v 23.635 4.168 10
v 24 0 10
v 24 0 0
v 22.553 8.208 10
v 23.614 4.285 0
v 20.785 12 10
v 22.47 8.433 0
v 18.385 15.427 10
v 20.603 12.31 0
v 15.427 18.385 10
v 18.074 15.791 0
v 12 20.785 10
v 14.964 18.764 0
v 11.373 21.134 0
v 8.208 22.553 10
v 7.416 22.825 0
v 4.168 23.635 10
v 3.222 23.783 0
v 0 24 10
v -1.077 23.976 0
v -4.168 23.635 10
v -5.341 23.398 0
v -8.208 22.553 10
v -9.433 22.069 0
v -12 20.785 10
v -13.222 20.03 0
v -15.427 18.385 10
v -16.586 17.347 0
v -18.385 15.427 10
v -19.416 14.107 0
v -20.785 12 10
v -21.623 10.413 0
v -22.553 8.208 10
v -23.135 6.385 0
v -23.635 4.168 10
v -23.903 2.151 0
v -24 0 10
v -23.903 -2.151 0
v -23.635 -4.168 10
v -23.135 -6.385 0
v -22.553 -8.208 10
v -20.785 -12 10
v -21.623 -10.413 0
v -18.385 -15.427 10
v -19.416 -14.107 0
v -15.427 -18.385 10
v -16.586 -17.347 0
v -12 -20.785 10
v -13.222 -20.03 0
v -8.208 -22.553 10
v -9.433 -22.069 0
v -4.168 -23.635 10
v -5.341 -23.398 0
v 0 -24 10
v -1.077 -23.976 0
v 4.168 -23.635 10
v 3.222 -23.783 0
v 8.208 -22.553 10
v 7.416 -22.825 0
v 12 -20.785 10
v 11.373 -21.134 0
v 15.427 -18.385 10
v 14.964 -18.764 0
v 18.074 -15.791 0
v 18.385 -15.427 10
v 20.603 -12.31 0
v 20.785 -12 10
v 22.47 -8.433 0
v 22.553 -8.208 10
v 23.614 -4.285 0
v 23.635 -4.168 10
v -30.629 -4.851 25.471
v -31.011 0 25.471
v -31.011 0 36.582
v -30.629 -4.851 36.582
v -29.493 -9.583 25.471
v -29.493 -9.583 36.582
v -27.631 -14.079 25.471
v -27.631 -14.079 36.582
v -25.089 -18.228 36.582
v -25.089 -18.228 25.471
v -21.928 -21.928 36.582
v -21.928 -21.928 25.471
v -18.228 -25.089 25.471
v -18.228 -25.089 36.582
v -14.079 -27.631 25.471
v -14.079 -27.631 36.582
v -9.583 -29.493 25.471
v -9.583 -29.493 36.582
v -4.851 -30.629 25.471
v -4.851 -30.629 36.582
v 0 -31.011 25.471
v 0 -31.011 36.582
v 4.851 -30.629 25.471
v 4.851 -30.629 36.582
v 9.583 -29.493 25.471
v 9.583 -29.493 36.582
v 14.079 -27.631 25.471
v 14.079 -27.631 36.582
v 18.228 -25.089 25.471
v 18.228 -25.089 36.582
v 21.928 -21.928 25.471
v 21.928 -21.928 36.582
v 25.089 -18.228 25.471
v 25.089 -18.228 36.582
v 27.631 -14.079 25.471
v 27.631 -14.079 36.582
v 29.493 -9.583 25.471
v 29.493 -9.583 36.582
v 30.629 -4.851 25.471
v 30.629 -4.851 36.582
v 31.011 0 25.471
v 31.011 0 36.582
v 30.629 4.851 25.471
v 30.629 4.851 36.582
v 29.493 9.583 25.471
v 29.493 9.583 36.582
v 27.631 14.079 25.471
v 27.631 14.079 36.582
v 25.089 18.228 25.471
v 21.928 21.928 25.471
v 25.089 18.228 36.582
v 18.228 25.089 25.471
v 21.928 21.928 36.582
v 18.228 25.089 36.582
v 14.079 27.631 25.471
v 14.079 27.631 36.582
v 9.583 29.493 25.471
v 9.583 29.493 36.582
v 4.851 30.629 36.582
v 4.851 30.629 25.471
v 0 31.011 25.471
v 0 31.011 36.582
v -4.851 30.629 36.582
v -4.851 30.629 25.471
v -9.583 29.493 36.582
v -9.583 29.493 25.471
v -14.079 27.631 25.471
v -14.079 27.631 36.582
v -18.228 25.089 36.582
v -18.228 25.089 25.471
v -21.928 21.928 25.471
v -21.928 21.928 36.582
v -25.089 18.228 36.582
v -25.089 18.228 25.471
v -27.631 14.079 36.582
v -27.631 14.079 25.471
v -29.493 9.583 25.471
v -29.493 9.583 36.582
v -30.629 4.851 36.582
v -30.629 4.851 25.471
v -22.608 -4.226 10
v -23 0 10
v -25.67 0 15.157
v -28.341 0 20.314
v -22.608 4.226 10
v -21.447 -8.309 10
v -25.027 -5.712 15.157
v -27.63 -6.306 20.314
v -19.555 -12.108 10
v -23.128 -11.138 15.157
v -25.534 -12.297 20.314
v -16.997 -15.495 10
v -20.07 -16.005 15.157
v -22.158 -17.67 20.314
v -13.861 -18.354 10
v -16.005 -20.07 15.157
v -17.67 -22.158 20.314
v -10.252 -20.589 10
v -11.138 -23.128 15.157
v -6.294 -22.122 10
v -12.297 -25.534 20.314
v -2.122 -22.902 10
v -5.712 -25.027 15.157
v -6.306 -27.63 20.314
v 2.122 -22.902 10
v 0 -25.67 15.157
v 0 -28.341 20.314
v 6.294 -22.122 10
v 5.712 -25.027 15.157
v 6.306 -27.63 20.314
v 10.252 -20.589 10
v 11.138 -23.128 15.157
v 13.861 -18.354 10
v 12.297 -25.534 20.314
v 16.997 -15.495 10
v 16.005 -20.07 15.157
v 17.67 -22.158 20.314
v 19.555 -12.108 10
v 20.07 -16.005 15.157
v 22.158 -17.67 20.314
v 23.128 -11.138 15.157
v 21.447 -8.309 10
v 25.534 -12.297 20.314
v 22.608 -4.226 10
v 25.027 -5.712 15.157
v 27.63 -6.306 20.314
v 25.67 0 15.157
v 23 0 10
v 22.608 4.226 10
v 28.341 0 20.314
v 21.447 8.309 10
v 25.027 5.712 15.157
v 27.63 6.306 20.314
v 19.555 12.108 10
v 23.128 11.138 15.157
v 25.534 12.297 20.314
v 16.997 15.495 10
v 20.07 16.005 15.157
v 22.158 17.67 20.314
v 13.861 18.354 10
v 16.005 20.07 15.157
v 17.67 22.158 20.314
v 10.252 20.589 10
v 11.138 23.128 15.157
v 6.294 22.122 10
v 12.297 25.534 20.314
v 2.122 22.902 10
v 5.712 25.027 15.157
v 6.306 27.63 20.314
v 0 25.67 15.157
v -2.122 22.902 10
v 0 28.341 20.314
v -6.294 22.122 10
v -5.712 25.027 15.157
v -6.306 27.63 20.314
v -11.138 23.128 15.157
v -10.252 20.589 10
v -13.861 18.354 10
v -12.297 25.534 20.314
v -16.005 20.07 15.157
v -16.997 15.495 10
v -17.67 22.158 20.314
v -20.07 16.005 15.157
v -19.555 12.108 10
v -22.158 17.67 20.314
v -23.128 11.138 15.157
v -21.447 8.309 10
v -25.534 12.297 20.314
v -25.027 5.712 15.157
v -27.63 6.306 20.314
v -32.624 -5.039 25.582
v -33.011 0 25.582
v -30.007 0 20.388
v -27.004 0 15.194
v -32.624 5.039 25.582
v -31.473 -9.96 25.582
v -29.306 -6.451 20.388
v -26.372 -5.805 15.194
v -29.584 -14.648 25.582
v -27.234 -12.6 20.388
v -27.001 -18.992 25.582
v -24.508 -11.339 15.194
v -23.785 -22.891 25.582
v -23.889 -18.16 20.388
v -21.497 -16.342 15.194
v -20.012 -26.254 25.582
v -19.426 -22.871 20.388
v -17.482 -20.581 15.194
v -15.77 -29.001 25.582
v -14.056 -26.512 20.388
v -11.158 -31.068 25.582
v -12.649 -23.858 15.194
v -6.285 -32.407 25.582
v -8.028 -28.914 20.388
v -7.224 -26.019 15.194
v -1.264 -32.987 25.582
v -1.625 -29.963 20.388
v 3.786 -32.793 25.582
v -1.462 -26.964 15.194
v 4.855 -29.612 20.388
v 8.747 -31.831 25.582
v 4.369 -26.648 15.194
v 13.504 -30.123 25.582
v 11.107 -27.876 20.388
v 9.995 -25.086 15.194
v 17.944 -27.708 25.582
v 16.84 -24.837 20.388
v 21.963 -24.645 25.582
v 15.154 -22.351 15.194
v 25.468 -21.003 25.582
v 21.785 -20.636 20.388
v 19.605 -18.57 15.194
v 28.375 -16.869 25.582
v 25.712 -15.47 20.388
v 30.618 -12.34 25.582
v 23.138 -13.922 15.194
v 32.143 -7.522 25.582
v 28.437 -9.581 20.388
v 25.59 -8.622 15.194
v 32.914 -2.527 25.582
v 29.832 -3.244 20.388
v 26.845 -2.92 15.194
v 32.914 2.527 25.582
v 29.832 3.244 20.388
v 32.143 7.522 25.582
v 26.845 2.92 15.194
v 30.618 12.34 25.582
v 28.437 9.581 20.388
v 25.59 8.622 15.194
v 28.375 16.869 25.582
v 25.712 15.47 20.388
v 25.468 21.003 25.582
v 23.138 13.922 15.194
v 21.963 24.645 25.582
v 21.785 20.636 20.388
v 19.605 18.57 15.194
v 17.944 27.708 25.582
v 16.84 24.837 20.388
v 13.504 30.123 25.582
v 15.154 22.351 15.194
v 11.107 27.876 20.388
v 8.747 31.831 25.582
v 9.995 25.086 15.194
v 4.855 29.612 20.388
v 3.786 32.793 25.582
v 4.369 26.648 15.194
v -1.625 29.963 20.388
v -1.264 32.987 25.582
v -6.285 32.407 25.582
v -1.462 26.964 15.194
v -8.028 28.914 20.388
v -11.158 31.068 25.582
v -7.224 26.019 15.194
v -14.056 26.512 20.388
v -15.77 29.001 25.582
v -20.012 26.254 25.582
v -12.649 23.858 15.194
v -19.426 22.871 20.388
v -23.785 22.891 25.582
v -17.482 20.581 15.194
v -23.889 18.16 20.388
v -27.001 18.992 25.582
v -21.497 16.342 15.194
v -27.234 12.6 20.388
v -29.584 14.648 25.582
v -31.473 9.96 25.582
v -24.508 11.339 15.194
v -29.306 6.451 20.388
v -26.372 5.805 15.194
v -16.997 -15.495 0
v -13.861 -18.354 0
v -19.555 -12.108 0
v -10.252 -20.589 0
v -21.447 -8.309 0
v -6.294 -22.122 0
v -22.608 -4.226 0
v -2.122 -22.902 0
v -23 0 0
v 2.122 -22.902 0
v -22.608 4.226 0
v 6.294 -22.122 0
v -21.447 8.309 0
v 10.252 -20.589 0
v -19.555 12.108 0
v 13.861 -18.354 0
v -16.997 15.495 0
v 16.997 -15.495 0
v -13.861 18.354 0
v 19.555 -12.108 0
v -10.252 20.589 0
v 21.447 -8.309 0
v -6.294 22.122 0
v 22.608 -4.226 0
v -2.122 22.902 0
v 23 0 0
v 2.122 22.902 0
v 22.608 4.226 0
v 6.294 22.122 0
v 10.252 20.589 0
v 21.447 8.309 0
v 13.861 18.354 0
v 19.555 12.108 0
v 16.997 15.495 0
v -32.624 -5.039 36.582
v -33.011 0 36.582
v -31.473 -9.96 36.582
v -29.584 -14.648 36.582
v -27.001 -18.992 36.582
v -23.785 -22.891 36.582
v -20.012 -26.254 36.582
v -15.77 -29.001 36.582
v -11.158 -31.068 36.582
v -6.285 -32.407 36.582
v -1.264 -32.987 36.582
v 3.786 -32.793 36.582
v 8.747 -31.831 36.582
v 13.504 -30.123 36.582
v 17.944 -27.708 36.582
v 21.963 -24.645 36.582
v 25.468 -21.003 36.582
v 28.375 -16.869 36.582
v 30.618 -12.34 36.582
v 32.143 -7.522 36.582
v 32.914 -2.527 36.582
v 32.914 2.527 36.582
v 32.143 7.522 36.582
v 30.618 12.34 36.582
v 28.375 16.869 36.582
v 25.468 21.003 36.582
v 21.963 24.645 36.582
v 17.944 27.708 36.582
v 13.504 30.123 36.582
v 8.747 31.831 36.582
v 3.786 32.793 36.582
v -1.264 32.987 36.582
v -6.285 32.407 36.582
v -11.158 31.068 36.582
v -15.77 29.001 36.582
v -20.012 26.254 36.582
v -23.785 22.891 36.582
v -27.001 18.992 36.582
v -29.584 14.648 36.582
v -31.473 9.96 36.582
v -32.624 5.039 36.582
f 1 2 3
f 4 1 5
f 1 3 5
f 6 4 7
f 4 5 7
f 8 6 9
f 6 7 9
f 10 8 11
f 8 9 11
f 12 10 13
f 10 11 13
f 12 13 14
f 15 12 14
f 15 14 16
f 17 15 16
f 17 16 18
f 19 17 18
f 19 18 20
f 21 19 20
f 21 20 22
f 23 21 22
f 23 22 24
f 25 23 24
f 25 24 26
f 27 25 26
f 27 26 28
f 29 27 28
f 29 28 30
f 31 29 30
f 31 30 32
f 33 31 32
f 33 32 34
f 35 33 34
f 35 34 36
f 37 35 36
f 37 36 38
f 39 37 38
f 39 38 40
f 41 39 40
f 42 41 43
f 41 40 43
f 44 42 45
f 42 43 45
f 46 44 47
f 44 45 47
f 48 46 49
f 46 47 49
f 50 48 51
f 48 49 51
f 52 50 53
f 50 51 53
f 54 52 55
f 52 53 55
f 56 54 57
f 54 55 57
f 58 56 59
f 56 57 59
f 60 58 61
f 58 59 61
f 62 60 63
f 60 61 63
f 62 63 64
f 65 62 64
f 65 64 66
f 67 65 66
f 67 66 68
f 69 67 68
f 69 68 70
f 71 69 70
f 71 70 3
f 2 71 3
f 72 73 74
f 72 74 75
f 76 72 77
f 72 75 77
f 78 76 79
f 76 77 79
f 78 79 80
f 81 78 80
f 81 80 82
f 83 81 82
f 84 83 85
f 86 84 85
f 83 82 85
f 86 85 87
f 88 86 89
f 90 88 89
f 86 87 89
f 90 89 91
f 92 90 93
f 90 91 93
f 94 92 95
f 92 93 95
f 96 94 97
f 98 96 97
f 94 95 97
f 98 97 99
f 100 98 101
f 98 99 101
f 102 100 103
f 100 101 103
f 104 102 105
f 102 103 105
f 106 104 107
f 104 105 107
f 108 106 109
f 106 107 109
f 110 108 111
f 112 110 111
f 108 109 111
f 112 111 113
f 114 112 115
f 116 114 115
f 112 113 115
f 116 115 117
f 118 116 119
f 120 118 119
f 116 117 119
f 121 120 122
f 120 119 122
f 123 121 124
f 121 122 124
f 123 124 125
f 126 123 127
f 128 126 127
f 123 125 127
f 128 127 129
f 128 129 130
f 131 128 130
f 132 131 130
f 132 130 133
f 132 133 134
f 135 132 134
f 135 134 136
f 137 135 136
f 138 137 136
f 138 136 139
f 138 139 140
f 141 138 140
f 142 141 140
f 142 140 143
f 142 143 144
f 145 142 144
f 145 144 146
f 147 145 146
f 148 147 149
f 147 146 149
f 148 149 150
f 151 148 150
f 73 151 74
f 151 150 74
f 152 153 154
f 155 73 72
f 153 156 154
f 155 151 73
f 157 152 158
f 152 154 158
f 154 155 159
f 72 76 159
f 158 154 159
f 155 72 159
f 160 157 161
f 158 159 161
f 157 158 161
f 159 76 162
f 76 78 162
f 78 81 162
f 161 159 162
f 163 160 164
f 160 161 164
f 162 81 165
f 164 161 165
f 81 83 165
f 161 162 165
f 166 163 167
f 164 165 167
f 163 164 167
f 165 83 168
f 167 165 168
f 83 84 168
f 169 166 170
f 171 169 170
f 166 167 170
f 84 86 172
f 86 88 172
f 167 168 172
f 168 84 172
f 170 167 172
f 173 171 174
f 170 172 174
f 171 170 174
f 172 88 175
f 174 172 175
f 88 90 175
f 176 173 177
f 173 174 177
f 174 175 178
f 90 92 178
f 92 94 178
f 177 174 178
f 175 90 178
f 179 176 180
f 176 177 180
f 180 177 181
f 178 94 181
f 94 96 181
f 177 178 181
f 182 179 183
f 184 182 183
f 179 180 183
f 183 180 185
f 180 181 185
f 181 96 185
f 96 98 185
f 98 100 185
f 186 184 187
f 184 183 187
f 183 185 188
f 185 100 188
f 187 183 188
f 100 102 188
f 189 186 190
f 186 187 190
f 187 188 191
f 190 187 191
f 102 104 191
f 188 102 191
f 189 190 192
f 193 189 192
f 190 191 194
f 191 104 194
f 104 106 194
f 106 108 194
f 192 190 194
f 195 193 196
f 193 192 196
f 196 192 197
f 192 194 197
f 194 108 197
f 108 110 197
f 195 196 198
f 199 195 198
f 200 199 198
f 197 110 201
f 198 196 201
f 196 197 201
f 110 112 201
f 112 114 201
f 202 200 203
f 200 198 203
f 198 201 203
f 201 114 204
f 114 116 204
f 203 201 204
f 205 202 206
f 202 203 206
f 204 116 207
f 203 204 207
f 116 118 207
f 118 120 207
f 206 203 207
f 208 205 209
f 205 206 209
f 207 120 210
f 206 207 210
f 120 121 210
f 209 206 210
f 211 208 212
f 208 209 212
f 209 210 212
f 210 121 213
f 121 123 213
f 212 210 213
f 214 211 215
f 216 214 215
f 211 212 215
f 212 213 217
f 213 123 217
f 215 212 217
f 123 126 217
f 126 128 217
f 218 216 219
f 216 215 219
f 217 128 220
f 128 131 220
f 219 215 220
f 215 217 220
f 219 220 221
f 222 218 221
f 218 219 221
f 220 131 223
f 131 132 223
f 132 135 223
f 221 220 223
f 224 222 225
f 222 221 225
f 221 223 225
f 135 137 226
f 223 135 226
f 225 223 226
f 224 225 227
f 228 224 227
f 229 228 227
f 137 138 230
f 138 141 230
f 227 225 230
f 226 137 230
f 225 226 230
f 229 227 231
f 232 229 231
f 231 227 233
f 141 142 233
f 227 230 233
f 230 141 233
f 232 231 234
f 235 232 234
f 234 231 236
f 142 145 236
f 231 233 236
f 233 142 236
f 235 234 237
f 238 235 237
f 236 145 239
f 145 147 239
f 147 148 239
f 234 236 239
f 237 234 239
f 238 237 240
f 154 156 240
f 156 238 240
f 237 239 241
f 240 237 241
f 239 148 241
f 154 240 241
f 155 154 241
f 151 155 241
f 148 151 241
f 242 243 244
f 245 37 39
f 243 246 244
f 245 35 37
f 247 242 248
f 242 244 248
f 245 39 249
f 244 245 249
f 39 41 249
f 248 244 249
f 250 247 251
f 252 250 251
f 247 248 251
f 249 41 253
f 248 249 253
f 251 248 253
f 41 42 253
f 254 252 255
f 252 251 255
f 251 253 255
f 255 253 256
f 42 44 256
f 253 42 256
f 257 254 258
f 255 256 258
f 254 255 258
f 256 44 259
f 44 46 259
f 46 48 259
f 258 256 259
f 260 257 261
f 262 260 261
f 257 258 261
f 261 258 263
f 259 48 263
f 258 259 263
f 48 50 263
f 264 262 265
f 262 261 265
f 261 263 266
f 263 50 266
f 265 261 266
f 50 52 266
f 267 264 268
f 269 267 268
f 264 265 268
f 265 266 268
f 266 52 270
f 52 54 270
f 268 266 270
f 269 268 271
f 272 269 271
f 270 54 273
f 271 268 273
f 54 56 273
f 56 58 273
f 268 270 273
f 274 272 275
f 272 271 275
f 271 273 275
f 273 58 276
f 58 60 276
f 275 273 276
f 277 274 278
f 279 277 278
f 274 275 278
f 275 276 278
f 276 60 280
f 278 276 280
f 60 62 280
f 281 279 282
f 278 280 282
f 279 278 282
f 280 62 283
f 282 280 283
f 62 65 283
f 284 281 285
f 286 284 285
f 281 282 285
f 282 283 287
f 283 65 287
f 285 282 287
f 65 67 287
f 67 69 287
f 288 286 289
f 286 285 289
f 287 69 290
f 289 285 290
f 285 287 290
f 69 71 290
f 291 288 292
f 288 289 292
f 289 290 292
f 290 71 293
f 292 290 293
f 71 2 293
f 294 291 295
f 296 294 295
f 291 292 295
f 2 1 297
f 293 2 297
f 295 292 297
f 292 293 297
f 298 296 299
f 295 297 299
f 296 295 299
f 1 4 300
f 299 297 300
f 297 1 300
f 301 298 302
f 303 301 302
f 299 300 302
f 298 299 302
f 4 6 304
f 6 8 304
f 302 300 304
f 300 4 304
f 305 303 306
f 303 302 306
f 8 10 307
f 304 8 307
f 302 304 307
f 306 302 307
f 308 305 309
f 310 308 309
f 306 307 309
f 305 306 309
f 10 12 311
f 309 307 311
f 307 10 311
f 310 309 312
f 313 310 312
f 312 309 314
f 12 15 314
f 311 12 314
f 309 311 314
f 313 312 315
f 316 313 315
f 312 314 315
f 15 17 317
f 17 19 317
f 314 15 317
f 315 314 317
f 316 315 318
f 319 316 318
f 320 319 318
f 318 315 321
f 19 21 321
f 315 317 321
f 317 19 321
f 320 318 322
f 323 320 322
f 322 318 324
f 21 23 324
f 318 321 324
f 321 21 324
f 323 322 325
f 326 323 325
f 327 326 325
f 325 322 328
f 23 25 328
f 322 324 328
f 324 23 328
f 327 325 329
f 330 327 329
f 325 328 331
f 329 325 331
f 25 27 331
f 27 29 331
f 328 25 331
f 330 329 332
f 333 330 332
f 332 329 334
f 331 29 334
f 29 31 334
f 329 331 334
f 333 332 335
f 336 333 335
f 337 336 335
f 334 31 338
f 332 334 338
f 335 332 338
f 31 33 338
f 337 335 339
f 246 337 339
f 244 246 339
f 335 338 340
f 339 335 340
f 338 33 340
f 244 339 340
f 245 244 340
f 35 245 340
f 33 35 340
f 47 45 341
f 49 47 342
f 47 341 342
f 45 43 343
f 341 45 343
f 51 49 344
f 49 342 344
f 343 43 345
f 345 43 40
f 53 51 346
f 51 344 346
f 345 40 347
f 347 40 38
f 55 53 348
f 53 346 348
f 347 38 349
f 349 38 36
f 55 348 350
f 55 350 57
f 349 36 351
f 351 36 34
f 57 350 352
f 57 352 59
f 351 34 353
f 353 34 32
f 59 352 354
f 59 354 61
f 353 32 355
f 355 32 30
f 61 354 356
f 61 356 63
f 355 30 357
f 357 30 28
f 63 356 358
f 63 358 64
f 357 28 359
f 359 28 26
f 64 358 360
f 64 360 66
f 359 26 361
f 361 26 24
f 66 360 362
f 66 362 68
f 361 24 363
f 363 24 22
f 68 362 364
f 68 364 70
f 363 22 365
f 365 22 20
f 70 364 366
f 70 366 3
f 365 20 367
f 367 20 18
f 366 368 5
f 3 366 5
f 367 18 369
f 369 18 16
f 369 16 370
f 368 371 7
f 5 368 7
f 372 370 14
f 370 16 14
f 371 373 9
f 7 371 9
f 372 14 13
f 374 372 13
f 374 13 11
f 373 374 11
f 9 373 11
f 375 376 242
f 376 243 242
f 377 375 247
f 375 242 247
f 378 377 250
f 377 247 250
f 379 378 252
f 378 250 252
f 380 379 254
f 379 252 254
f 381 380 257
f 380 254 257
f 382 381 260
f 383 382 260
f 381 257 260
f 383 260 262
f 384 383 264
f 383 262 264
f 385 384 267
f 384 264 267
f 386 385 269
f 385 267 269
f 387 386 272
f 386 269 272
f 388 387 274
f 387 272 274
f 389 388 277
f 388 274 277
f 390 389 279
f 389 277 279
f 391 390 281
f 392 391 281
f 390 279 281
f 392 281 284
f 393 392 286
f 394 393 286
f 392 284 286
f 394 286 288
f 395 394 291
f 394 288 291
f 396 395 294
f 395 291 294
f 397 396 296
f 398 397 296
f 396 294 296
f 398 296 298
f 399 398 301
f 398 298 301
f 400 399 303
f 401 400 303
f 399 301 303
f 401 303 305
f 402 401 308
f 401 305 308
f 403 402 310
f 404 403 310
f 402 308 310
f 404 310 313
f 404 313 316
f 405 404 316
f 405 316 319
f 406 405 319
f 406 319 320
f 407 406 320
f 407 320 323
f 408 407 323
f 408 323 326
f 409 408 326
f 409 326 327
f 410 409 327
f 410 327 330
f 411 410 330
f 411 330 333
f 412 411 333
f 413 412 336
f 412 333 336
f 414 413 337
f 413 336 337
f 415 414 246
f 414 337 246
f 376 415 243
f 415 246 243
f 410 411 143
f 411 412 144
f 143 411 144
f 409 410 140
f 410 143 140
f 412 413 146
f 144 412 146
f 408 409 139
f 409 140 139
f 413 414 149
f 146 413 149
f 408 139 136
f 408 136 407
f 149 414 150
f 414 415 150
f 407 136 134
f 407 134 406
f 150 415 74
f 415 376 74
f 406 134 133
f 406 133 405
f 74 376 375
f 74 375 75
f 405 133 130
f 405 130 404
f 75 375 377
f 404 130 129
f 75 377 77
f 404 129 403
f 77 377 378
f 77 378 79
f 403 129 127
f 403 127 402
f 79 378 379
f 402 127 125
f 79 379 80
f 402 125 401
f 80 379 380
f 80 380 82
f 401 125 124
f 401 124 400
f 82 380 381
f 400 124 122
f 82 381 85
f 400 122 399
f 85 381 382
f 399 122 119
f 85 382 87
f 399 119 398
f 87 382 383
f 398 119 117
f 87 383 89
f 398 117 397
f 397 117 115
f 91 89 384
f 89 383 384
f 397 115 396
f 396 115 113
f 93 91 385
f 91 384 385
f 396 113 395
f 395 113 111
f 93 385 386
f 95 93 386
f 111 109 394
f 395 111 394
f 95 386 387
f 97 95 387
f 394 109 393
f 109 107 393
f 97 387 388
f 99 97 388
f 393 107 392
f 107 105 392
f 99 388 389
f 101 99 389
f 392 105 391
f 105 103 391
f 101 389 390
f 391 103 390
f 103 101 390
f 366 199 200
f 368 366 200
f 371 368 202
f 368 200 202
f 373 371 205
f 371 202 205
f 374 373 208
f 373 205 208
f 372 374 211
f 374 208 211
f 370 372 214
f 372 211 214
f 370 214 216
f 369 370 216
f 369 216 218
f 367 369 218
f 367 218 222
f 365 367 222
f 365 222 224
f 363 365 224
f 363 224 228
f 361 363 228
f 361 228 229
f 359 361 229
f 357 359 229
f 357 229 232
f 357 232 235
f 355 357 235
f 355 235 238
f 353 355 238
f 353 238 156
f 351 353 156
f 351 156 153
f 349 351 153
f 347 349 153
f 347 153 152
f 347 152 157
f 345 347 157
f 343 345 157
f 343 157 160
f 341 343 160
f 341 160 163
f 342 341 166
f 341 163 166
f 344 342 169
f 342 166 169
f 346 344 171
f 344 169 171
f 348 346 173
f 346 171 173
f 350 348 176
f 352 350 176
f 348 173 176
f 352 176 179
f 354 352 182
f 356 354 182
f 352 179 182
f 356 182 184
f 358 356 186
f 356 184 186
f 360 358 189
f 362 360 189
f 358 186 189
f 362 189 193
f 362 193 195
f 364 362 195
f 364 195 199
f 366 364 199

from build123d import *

# Parameters (mm, degrees)
F0_R     = 24
F1_DEPTH = 10
F2_R     = 23
F3_DEPTH = 10.001


with BuildPart() as f1:
    # F0 (on Top) → F1 (new body)
    with BuildSketch(Plane.XY):
        Circle(F0_R)
    extrude(amount=F1_DEPTH)

    # F2 (on face) → F3 (cut, through all)
    with BuildSketch(Plane.XY.offset(10)):
        Circle(F2_R)
    extrude(amount=-F3_DEPTH, mode=Mode.SUBTRACT)

    # F4 (on Front) → F5 (revolve)
    with BuildSketch(Plane.XZ):
        Polygon((-23, 10), (-31.011236, 25.47067), (-31.011236, 36.581965), (-33.011236, 36.581965), (-33.011236, 25.581965), (-24, 10), align=None)
    revolve(axis=Axis((0, 0, 10), (0, 0, 1)))


solid = f1.part
